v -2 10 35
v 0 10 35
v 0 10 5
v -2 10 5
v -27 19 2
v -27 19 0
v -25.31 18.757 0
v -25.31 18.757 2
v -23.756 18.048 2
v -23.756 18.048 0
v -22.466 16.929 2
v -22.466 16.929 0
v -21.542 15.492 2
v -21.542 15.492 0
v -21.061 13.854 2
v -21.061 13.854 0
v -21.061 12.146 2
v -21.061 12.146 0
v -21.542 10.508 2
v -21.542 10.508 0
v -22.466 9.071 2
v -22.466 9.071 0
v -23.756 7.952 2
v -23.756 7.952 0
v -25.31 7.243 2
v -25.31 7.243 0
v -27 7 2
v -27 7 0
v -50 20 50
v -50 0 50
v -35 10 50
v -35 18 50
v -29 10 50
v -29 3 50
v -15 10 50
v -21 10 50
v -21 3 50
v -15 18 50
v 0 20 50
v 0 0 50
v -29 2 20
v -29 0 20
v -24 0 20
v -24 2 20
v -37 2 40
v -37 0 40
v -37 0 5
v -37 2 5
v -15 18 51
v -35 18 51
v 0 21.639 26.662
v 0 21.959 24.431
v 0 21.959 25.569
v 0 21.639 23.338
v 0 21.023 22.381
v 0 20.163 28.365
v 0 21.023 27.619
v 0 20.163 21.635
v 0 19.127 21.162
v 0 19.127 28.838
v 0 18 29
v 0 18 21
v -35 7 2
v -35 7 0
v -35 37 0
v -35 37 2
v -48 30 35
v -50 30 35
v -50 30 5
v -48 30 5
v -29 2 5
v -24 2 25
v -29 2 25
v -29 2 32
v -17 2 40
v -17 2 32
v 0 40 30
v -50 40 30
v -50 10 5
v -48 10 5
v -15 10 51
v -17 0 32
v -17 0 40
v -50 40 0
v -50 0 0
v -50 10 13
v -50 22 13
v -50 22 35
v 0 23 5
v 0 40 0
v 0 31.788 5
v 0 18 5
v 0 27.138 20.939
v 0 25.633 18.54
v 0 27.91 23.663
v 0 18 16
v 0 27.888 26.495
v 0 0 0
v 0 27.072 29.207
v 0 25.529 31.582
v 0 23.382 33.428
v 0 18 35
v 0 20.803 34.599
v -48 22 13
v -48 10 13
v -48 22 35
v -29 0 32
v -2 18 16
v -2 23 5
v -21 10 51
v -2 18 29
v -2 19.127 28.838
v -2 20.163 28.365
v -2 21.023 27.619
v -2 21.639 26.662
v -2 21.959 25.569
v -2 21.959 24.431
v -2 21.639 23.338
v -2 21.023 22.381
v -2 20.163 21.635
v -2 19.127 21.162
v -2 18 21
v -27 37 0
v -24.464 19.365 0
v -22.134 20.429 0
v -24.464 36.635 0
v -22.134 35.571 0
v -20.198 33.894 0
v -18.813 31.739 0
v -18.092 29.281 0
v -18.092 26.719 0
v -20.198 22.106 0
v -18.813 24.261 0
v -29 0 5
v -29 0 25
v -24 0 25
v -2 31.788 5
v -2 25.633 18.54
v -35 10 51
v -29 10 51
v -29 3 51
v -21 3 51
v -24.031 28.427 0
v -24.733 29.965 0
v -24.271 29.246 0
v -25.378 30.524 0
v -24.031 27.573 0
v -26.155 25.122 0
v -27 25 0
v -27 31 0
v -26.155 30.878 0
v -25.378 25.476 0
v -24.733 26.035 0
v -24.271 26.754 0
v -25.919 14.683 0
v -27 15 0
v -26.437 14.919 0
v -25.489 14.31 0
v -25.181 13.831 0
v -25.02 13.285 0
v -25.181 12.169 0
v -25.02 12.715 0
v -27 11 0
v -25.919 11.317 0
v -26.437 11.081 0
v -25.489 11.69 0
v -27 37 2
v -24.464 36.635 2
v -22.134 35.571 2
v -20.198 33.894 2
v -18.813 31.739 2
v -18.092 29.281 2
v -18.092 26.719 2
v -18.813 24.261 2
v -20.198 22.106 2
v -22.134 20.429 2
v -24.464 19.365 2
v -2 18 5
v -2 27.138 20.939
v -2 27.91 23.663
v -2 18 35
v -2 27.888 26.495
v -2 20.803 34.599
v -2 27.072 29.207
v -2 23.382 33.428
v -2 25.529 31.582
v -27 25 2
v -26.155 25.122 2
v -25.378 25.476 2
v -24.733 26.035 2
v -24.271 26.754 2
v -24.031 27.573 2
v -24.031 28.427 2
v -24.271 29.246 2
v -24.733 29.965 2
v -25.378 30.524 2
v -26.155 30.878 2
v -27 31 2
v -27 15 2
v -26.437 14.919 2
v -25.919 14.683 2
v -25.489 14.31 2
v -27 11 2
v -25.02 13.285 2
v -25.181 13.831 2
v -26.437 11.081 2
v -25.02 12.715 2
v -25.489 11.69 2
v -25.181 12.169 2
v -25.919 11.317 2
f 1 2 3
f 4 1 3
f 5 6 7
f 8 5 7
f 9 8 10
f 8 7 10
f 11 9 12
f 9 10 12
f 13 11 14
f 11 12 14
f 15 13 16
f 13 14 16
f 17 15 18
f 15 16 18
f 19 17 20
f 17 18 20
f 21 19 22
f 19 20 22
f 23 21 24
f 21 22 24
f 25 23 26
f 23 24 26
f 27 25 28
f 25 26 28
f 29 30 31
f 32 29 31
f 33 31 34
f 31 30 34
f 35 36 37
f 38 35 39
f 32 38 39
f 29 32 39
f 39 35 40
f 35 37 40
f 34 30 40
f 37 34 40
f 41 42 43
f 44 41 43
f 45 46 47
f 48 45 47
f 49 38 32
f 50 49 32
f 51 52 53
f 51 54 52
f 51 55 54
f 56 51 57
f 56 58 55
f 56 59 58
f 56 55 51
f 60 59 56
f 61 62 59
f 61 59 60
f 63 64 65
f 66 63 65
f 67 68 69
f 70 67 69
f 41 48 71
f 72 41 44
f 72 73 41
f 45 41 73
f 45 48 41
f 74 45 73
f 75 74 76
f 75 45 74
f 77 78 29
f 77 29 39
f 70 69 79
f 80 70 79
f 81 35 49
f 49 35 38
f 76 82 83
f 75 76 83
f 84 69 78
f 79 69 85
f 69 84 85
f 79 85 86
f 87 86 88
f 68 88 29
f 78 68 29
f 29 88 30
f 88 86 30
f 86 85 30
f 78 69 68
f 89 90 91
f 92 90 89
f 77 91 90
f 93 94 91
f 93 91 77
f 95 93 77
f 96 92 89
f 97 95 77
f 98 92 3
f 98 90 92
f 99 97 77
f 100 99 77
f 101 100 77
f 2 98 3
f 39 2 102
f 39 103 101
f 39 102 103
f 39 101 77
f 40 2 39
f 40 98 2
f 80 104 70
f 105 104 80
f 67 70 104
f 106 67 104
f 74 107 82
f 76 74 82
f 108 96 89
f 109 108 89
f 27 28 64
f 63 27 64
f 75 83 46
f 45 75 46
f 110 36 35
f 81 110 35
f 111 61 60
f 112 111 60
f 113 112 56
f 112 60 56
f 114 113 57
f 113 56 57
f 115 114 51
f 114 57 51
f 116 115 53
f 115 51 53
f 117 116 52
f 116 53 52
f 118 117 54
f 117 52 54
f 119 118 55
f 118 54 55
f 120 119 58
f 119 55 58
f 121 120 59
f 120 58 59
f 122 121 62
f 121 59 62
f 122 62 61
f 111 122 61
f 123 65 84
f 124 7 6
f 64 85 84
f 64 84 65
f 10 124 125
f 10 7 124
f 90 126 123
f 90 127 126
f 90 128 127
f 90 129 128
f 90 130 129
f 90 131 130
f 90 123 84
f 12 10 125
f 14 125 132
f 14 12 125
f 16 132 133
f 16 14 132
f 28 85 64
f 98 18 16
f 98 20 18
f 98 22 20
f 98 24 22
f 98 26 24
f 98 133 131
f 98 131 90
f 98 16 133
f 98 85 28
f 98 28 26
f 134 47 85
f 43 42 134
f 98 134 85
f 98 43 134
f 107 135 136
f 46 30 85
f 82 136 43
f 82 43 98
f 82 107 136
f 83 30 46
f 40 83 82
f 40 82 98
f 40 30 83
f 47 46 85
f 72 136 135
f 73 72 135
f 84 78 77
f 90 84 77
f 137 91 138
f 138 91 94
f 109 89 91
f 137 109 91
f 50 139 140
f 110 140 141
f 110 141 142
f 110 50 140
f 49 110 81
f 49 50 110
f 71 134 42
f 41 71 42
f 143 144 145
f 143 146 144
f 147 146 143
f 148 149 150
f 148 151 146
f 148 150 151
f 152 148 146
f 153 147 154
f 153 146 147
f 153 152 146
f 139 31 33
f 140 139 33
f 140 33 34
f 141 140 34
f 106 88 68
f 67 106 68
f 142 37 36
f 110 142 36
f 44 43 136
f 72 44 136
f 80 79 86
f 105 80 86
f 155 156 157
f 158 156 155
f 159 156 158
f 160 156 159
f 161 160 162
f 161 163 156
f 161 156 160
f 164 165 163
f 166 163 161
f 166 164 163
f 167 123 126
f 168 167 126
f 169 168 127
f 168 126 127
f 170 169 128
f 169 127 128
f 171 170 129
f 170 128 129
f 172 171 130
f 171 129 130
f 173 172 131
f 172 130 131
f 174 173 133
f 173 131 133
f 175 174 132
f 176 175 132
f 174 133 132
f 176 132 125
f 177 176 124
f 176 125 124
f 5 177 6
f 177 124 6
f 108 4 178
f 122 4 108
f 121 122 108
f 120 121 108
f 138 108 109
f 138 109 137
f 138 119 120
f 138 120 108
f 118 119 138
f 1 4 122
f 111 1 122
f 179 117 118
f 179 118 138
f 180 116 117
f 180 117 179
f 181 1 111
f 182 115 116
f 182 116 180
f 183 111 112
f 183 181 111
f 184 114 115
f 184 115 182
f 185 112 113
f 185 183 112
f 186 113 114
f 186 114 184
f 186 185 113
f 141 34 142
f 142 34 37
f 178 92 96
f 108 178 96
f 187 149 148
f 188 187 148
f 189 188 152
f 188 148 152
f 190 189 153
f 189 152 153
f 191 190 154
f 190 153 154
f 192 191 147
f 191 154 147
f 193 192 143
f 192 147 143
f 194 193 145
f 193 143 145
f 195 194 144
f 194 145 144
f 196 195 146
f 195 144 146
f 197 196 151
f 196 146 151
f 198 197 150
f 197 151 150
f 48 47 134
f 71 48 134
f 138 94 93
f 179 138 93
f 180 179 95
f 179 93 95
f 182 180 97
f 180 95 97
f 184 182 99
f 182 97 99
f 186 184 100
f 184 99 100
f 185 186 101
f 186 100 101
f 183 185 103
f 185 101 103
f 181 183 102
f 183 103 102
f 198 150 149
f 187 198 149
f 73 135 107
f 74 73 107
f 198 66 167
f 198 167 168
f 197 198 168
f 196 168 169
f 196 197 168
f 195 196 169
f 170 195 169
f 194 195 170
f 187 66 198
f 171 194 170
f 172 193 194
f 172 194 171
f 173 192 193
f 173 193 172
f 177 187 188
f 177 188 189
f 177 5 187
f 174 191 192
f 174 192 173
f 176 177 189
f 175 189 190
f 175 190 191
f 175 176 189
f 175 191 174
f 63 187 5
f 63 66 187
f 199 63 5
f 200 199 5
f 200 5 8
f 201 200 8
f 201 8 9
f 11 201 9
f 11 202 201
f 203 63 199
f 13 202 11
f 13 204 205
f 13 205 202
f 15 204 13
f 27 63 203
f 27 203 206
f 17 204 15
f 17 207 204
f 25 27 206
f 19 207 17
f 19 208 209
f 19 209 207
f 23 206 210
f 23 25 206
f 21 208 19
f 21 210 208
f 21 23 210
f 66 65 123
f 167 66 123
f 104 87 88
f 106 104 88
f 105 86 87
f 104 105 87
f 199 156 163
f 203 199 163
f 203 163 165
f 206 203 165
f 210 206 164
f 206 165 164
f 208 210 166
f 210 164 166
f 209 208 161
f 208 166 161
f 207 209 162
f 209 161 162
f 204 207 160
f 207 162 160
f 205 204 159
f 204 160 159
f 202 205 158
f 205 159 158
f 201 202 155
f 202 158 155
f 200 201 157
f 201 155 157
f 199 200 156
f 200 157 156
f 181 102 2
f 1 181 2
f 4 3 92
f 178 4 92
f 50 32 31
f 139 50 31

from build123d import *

# Parameters (mm, degrees)
F0_W      = 50
F0_H      = 50
F1_DEPTH  = 40
F2_SIZE   = 20
F4_DEPTH  = 2
F6_DEPTH  = 2
F8_DEPTH  = 2
F10_DEPTH = 1
F12_DEPTH = 2


with BuildPart() as f1:
    # F0 (on Front) → F1 (new body)
    with BuildSketch(Plane.XZ):
        with Locations((-25, 25)):
            Rectangle(F0_W, F0_H)
    extrude(amount=-F1_DEPTH)

    # F2
    f2_edges = [f1.edges().sort_by_distance(p)[0] for p in [
        (-25, 40, 50),
    ]]
    chamfer(f2_edges, length=F2_SIZE)

    # F3 (on face) → F4 (cut)
    with BuildSketch(Plane.XZ):
        Polygon((-37, 40), (-37, 5), (-29, 5), (-29, 20), (-24, 20), (-24, 25), (-29, 25), (-29, 32), (-17, 32), (-17, 40), align=None)
    extrude(amount=-F4_DEPTH, mode=Mode.SUBTRACT)

    # F5 (on face) → F6 (cut)
    with BuildSketch(Plane.YZ):
        with BuildLine():
            Line((10, 35), (10, 5))
            Line((10, 5), (18, 5))
            Line((18, 5), (18, 16))
            Line((18, 16), (23, 5))
            Line((23, 5), (31.78767, 5))
            Line((31.78767, 5), (25.633212, 18.539808))
            ThreePointArc((25.633212, 18.539808), (27.071988, 29.207023), (18, 35))
            Line((18, 35), (10, 35))
        make_face()
        with BuildLine():
            Line((18, 21), (18, 29))
            ThreePointArc((18, 29), (22, 25), (18, 21))
        make_face(mode=Mode.SUBTRACT)
    extrude(amount=-F6_DEPTH, mode=Mode.SUBTRACT)

    # F7 (on face) → F8 (cut)
    with BuildSketch(Plane(origin=(-50, 0, 0), x_dir=(0, -1, 0), z_dir=(-1, 0, 0))):
        Polygon((-22, 35), (-30, 35), (-30, 5), (-10, 5), (-10, 13), (-22, 13), align=None)
    extrude(amount=-F8_DEPTH, mode=Mode.SUBTRACT)

    # F9 (on face) → F10 (join)
    with BuildSketch(Plane.XY.offset(50)):
        Polygon((-29, 10), (-29, 3), (-21, 3), (-21, 10), (-15, 10), (-15, 18), (-35, 18), (-35, 10), align=None)
    extrude(amount=F10_DEPTH)

    # F11 (on face) → F12 (cut)
    with BuildSketch(Plane(origin=(0, 0, 0), x_dir=(1, 0, 0), z_dir=(0, 0, -1))):
        with BuildLine():
            Line((-35, -7), (-35, -37))
            Line((-35, -37), (-27, -37))
            ThreePointArc((-27, -37), (-18, -28), (-27, -19))
            ThreePointArc((-27, -19), (-21, -13), (-27, -7))
            Line((-27, -7), (-35, -7))
        make_face()
        with BuildLine():
            ThreePointArc((-27, -25), (-24, -28), (-27, -31))
            Line((-27, -31), (-27, -25))
        make_face(mode=Mode.SUBTRACT)
        with BuildLine():
            Line((-27, -15), (-27, -11))
            ThreePointArc((-27, -11), (-25, -13), (-27, -15))
        make_face(mode=Mode.SUBTRACT)
    extrude(amount=-F12_DEPTH, mode=Mode.SUBTRACT)


solid = f1.part
